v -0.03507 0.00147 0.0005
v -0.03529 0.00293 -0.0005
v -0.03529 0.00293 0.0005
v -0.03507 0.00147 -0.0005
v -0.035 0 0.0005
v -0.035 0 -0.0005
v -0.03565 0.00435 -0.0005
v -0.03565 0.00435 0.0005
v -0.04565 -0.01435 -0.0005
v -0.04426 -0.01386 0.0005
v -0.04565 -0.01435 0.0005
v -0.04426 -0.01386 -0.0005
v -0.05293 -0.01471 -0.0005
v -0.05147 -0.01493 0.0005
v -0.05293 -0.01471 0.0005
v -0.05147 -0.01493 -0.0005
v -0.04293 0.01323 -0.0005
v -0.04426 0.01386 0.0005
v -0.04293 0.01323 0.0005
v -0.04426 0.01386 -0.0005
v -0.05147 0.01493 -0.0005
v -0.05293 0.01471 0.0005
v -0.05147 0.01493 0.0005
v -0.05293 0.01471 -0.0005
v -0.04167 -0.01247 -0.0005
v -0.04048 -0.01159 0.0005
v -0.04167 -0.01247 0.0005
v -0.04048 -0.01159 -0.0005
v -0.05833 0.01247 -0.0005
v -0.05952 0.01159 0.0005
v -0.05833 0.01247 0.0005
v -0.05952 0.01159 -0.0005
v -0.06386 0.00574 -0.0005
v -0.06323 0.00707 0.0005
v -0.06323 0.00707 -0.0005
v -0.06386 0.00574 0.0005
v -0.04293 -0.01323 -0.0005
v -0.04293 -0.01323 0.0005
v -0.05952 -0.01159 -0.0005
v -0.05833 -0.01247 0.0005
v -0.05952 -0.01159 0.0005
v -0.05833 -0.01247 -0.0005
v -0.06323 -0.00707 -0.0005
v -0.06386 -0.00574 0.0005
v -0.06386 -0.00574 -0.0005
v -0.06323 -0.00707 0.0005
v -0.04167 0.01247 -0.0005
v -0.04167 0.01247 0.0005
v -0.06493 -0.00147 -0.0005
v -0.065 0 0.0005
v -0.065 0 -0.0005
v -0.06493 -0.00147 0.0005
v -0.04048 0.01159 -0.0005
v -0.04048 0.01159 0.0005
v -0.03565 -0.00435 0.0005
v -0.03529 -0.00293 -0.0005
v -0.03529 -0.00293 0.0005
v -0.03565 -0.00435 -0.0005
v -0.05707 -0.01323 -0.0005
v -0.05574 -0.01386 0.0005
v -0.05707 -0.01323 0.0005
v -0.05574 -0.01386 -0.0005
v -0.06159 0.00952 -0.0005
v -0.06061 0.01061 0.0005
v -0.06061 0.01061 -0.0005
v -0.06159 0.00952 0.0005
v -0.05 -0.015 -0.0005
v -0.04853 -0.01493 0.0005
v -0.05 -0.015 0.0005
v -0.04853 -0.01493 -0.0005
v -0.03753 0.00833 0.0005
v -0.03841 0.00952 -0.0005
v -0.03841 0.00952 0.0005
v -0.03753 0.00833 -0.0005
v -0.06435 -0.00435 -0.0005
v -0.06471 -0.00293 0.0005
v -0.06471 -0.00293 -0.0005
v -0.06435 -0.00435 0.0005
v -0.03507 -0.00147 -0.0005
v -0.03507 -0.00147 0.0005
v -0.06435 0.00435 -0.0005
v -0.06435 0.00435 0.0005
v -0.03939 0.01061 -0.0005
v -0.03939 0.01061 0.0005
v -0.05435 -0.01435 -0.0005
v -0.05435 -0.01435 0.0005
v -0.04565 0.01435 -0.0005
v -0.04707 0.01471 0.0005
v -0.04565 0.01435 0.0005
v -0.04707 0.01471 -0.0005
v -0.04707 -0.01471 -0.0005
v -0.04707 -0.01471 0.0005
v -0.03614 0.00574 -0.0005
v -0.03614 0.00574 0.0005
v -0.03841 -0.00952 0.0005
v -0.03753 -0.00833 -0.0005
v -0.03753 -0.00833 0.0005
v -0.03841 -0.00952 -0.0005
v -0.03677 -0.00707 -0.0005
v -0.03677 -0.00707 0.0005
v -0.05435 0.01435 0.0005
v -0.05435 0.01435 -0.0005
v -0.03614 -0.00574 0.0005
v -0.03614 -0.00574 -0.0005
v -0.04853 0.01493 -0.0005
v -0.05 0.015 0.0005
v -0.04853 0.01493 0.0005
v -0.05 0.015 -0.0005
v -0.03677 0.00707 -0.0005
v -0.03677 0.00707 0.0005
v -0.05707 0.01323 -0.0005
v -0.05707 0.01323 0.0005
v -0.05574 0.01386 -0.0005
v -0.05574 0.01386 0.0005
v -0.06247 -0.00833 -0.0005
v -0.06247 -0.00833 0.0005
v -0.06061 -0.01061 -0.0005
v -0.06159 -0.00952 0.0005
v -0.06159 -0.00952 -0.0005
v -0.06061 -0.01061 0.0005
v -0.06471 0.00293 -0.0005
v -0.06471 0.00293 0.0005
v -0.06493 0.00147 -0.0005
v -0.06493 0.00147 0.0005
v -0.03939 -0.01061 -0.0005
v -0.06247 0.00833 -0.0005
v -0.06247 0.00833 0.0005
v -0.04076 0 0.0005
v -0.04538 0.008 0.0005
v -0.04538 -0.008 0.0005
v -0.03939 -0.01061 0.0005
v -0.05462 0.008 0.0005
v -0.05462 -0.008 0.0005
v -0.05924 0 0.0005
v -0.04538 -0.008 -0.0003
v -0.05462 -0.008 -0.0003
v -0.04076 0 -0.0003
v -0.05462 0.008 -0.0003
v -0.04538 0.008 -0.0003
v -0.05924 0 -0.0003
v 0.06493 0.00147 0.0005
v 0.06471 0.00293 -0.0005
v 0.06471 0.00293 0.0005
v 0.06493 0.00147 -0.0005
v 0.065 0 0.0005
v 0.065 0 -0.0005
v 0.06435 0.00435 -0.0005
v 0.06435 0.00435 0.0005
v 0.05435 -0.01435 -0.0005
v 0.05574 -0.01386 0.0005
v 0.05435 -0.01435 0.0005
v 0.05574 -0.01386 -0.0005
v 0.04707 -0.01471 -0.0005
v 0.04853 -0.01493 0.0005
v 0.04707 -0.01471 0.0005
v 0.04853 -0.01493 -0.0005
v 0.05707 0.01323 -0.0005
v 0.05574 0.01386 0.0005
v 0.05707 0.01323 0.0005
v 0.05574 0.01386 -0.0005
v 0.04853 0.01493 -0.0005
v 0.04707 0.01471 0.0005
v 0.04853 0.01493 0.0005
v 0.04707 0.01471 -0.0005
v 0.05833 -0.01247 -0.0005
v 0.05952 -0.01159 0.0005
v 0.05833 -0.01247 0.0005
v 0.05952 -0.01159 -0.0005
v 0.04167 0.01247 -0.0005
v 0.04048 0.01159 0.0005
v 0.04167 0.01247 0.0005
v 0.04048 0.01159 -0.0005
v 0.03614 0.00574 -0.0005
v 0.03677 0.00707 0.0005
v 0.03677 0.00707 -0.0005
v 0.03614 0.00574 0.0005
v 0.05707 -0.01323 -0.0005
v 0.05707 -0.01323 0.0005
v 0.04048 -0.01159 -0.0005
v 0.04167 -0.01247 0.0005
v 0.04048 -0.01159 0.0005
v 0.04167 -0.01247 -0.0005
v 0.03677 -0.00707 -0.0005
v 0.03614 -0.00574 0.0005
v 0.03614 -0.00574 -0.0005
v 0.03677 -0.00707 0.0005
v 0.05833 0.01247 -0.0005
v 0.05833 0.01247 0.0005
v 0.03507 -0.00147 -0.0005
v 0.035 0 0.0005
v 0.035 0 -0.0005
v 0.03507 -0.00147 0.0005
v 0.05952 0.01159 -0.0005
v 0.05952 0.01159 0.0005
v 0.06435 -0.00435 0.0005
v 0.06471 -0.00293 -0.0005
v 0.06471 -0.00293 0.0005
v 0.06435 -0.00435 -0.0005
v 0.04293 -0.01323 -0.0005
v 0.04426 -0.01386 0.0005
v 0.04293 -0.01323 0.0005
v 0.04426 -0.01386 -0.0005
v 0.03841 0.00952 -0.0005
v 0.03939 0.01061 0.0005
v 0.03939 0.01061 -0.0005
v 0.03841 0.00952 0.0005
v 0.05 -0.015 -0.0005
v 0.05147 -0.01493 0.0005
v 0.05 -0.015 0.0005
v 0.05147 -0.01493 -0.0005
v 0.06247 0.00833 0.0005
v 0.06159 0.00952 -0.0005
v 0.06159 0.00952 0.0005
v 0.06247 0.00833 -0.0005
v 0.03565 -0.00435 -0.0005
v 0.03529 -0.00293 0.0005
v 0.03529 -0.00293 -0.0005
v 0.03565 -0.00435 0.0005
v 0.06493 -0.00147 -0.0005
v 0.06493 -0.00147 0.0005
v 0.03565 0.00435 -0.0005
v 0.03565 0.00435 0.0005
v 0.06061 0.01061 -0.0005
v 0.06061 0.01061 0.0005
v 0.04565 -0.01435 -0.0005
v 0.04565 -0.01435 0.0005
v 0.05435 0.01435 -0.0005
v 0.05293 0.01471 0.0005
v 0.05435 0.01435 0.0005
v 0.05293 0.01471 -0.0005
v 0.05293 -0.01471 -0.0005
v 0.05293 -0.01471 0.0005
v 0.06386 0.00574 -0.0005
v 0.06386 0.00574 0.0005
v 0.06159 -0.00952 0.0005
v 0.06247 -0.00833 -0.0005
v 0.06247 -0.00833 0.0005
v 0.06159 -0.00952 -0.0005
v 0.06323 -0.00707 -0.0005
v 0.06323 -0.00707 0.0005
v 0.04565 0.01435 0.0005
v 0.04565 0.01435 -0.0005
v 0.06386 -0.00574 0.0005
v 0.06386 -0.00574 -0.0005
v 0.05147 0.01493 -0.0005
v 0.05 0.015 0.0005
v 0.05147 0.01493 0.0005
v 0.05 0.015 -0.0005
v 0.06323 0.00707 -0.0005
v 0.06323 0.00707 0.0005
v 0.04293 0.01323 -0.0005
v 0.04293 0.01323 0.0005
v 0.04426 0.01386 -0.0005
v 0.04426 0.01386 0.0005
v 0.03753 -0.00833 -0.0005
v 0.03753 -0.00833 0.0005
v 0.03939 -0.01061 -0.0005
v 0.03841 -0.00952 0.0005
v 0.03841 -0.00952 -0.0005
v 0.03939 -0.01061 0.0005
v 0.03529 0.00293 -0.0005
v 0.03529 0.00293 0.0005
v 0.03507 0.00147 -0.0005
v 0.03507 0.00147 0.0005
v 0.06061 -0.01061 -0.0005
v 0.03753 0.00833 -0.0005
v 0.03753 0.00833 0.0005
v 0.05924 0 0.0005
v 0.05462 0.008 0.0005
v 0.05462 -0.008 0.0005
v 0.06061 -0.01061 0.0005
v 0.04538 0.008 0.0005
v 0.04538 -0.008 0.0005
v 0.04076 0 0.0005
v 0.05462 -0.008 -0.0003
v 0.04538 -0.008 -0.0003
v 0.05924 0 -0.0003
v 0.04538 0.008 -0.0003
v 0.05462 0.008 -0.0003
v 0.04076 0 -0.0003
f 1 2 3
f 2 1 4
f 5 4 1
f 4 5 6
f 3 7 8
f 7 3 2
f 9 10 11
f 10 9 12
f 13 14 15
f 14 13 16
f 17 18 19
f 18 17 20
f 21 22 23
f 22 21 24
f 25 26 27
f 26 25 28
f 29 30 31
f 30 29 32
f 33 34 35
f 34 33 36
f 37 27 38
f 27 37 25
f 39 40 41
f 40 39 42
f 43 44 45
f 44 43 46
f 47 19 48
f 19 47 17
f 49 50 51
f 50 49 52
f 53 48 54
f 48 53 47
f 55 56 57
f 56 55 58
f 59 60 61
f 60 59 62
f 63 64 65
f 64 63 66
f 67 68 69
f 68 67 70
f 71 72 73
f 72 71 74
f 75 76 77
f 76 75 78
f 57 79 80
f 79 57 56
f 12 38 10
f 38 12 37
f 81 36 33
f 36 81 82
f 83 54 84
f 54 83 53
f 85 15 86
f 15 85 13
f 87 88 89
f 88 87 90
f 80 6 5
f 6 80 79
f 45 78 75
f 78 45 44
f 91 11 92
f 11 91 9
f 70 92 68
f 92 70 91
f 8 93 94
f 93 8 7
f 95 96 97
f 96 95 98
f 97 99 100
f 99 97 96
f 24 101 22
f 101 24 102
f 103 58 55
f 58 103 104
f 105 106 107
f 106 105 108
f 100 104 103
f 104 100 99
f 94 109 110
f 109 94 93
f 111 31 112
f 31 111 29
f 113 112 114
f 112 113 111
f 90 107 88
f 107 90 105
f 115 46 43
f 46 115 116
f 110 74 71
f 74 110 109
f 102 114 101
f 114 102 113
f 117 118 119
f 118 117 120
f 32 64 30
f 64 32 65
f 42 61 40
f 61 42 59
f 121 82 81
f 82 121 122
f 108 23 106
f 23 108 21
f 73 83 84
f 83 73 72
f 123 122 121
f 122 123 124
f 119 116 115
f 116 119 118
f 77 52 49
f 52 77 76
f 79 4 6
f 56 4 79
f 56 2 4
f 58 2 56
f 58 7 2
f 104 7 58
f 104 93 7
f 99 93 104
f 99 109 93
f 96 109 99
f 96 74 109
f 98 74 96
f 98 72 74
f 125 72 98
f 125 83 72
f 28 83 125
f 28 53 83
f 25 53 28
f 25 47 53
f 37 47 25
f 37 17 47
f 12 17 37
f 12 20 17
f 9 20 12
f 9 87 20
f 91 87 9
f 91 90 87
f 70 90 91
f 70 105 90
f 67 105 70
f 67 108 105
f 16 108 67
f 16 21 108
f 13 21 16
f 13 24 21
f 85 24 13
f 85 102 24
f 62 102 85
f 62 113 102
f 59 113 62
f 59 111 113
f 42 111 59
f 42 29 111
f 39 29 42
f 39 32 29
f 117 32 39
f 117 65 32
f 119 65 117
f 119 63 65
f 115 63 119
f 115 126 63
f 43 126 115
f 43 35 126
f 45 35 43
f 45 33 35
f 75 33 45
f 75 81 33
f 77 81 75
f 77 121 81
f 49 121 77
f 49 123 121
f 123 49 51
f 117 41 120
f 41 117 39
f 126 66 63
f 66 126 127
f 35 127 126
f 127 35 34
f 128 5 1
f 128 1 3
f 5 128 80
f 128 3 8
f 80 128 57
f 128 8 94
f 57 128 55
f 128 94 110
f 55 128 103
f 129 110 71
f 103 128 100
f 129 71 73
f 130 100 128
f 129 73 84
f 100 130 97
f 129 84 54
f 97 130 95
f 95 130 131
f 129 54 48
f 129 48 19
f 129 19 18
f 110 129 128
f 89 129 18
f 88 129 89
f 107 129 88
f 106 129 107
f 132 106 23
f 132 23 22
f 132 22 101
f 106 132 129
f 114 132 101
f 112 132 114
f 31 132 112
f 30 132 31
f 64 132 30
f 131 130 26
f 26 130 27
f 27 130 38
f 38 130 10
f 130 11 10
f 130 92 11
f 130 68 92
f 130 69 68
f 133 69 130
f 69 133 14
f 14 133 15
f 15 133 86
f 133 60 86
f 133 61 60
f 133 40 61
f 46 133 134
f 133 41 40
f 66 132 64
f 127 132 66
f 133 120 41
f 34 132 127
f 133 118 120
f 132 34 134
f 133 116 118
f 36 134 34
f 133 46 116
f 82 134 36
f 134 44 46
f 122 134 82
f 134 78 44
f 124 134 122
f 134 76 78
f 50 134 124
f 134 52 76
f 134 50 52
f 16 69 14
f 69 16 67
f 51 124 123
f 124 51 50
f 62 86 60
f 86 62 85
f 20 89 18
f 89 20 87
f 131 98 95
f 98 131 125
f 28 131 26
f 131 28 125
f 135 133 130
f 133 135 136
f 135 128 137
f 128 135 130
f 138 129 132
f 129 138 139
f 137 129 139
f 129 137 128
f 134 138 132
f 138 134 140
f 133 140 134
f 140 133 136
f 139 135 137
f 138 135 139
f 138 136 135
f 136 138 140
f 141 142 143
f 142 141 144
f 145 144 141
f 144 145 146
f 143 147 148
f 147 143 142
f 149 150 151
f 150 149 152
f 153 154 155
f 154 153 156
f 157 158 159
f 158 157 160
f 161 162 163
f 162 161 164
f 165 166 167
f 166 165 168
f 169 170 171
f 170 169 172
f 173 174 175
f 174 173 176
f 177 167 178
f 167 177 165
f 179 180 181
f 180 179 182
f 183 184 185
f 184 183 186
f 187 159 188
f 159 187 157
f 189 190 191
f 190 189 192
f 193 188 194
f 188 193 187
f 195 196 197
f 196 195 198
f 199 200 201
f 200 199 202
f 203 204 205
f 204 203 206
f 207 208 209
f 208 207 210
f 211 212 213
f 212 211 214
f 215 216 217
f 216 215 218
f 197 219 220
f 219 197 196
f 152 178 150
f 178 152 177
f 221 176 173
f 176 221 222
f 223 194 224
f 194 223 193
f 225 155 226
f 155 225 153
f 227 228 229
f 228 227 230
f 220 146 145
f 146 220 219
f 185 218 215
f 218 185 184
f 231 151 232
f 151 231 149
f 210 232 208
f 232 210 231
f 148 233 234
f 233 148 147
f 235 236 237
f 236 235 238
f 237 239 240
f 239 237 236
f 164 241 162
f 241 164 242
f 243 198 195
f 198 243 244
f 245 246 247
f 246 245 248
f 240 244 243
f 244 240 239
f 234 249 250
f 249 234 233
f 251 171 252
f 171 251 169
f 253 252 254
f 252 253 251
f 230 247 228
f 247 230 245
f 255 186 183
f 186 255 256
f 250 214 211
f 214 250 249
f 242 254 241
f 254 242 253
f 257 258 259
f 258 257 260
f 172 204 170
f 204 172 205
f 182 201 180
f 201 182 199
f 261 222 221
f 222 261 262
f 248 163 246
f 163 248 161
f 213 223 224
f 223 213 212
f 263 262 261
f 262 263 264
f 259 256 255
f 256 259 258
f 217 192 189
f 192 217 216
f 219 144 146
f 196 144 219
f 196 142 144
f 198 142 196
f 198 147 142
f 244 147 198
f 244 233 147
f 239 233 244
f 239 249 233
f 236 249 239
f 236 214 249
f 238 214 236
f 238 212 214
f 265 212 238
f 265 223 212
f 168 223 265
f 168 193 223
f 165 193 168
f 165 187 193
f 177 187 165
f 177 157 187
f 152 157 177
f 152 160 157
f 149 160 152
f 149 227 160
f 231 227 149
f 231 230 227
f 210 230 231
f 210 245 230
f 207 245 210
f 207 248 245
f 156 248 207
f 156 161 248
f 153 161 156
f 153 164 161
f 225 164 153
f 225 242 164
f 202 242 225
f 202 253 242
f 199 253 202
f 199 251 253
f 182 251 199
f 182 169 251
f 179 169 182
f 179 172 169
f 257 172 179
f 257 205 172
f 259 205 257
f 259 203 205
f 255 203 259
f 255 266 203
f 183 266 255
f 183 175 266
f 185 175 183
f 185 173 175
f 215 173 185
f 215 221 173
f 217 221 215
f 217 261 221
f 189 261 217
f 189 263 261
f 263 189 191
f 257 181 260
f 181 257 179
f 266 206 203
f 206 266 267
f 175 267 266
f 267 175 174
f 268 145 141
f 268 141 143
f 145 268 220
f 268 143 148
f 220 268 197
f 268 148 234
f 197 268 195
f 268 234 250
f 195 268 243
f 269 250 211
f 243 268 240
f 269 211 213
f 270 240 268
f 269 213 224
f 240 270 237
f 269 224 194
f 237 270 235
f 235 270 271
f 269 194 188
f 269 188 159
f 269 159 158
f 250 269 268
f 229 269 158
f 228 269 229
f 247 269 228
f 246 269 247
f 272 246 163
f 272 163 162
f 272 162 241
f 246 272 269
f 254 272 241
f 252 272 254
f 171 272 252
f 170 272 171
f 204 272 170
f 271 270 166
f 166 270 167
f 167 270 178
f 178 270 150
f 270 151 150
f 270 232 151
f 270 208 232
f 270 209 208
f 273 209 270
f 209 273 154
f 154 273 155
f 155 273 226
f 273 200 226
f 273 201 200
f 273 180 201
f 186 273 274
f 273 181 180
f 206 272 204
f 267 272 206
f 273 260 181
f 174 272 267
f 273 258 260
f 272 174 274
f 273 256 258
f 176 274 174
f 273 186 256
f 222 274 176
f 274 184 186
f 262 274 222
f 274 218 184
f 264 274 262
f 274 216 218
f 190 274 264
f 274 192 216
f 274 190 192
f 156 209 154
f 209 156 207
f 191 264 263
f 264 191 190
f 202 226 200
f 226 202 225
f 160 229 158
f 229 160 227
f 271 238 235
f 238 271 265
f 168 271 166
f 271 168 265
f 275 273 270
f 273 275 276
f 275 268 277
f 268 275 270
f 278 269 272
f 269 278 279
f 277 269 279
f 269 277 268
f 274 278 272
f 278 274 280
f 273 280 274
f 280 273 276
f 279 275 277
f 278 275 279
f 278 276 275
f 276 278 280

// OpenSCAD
$fn=64;

eps = 0.01;

// Bounding box target: 0.1 x 0.0 x 0.1 mm (use very thin Y to approximate 0.0)
L = 0.1;          // overall length along X
H = 0.1;          // overall height along Z
T = 0.001;        // thickness along Y (approx 0.0)
rod_d = 0.02;     // strap/rod thickness (in XZ plane)
boss_d = 0.03;    // end boss diameter (in XZ plane)
boss_len = T;     // boss length along Y (same as thickness)
hex_af = 0.016;   // hex across flats
hex_depth = T*0.8;

module capsule_x(len, d, t){
    // 2D capsule in XZ, extruded along Y
    linear_extrude(height=t, center=true, convexity=10)
        hull(){
            translate([-len/2, 0]) circle(d=d);
            translate([ len/2, 0]) circle(d=d);
        }
}

module u_strap_2d(){
    // U-shape in XZ: outer capsule minus inner capsule, open at top
    difference(){
        union(){
            // outer U
            difference(){
                translate([0, -H/2]) capsule_x(L, rod_d, 0.001); // placeholder thickness ignored in 2D
                translate([0, -H/2]) capsule_x(L-rod_d*1.2, rod_d*0.6, 0.001);
            }
            // remove top to make it a U (open at +Z)
            // (done by subtracting a big rectangle above midline)
        }
        translate([0, 0.02]) square([L*2, H*2], center=true);
    }
}

module u_strap(){
    // Build U in XZ and extrude along Y
    linear_extrude(height=T, center=true, convexity=10)
        difference(){
            // Outer capsule
            translate([0, -H/2]) hull(){
                translate([-L/2, 0]) circle(d=rod_d);
                translate([ L/2, 0]) circle(d=rod_d);
            }
            // Inner capsule to create constant thickness
            translate([0, -H/2]) hull(){
                translate([-(L/2-rod_d*0.6), 0]) circle(d=rod_d*0.6);
                translate([ (L/2-rod_d*0.6), 0]) circle(d=rod_d*0.6);
            }
            // Open the top
            translate([0, H*0.25]) square([L*2, H*2], center=true);
        }
}

module boss_with_hex(xpos){
    translate([xpos, 0, 0])
    difference(){
        cylinder(h=boss_len, d=boss_d, center=true);
        // recessed hex socket along Y axis
        translate([0, 0, boss_len/2 - hex_depth/2 + eps])
            cylinder(h=hex_depth+2*eps, d=hex_af / cos(30), center=true, $fn=6);
    }
}

module part(){
    union(){
        u_strap();
        boss_with_hex(-L/2);
        boss_with_hex( L/2);
    }
}

part();
